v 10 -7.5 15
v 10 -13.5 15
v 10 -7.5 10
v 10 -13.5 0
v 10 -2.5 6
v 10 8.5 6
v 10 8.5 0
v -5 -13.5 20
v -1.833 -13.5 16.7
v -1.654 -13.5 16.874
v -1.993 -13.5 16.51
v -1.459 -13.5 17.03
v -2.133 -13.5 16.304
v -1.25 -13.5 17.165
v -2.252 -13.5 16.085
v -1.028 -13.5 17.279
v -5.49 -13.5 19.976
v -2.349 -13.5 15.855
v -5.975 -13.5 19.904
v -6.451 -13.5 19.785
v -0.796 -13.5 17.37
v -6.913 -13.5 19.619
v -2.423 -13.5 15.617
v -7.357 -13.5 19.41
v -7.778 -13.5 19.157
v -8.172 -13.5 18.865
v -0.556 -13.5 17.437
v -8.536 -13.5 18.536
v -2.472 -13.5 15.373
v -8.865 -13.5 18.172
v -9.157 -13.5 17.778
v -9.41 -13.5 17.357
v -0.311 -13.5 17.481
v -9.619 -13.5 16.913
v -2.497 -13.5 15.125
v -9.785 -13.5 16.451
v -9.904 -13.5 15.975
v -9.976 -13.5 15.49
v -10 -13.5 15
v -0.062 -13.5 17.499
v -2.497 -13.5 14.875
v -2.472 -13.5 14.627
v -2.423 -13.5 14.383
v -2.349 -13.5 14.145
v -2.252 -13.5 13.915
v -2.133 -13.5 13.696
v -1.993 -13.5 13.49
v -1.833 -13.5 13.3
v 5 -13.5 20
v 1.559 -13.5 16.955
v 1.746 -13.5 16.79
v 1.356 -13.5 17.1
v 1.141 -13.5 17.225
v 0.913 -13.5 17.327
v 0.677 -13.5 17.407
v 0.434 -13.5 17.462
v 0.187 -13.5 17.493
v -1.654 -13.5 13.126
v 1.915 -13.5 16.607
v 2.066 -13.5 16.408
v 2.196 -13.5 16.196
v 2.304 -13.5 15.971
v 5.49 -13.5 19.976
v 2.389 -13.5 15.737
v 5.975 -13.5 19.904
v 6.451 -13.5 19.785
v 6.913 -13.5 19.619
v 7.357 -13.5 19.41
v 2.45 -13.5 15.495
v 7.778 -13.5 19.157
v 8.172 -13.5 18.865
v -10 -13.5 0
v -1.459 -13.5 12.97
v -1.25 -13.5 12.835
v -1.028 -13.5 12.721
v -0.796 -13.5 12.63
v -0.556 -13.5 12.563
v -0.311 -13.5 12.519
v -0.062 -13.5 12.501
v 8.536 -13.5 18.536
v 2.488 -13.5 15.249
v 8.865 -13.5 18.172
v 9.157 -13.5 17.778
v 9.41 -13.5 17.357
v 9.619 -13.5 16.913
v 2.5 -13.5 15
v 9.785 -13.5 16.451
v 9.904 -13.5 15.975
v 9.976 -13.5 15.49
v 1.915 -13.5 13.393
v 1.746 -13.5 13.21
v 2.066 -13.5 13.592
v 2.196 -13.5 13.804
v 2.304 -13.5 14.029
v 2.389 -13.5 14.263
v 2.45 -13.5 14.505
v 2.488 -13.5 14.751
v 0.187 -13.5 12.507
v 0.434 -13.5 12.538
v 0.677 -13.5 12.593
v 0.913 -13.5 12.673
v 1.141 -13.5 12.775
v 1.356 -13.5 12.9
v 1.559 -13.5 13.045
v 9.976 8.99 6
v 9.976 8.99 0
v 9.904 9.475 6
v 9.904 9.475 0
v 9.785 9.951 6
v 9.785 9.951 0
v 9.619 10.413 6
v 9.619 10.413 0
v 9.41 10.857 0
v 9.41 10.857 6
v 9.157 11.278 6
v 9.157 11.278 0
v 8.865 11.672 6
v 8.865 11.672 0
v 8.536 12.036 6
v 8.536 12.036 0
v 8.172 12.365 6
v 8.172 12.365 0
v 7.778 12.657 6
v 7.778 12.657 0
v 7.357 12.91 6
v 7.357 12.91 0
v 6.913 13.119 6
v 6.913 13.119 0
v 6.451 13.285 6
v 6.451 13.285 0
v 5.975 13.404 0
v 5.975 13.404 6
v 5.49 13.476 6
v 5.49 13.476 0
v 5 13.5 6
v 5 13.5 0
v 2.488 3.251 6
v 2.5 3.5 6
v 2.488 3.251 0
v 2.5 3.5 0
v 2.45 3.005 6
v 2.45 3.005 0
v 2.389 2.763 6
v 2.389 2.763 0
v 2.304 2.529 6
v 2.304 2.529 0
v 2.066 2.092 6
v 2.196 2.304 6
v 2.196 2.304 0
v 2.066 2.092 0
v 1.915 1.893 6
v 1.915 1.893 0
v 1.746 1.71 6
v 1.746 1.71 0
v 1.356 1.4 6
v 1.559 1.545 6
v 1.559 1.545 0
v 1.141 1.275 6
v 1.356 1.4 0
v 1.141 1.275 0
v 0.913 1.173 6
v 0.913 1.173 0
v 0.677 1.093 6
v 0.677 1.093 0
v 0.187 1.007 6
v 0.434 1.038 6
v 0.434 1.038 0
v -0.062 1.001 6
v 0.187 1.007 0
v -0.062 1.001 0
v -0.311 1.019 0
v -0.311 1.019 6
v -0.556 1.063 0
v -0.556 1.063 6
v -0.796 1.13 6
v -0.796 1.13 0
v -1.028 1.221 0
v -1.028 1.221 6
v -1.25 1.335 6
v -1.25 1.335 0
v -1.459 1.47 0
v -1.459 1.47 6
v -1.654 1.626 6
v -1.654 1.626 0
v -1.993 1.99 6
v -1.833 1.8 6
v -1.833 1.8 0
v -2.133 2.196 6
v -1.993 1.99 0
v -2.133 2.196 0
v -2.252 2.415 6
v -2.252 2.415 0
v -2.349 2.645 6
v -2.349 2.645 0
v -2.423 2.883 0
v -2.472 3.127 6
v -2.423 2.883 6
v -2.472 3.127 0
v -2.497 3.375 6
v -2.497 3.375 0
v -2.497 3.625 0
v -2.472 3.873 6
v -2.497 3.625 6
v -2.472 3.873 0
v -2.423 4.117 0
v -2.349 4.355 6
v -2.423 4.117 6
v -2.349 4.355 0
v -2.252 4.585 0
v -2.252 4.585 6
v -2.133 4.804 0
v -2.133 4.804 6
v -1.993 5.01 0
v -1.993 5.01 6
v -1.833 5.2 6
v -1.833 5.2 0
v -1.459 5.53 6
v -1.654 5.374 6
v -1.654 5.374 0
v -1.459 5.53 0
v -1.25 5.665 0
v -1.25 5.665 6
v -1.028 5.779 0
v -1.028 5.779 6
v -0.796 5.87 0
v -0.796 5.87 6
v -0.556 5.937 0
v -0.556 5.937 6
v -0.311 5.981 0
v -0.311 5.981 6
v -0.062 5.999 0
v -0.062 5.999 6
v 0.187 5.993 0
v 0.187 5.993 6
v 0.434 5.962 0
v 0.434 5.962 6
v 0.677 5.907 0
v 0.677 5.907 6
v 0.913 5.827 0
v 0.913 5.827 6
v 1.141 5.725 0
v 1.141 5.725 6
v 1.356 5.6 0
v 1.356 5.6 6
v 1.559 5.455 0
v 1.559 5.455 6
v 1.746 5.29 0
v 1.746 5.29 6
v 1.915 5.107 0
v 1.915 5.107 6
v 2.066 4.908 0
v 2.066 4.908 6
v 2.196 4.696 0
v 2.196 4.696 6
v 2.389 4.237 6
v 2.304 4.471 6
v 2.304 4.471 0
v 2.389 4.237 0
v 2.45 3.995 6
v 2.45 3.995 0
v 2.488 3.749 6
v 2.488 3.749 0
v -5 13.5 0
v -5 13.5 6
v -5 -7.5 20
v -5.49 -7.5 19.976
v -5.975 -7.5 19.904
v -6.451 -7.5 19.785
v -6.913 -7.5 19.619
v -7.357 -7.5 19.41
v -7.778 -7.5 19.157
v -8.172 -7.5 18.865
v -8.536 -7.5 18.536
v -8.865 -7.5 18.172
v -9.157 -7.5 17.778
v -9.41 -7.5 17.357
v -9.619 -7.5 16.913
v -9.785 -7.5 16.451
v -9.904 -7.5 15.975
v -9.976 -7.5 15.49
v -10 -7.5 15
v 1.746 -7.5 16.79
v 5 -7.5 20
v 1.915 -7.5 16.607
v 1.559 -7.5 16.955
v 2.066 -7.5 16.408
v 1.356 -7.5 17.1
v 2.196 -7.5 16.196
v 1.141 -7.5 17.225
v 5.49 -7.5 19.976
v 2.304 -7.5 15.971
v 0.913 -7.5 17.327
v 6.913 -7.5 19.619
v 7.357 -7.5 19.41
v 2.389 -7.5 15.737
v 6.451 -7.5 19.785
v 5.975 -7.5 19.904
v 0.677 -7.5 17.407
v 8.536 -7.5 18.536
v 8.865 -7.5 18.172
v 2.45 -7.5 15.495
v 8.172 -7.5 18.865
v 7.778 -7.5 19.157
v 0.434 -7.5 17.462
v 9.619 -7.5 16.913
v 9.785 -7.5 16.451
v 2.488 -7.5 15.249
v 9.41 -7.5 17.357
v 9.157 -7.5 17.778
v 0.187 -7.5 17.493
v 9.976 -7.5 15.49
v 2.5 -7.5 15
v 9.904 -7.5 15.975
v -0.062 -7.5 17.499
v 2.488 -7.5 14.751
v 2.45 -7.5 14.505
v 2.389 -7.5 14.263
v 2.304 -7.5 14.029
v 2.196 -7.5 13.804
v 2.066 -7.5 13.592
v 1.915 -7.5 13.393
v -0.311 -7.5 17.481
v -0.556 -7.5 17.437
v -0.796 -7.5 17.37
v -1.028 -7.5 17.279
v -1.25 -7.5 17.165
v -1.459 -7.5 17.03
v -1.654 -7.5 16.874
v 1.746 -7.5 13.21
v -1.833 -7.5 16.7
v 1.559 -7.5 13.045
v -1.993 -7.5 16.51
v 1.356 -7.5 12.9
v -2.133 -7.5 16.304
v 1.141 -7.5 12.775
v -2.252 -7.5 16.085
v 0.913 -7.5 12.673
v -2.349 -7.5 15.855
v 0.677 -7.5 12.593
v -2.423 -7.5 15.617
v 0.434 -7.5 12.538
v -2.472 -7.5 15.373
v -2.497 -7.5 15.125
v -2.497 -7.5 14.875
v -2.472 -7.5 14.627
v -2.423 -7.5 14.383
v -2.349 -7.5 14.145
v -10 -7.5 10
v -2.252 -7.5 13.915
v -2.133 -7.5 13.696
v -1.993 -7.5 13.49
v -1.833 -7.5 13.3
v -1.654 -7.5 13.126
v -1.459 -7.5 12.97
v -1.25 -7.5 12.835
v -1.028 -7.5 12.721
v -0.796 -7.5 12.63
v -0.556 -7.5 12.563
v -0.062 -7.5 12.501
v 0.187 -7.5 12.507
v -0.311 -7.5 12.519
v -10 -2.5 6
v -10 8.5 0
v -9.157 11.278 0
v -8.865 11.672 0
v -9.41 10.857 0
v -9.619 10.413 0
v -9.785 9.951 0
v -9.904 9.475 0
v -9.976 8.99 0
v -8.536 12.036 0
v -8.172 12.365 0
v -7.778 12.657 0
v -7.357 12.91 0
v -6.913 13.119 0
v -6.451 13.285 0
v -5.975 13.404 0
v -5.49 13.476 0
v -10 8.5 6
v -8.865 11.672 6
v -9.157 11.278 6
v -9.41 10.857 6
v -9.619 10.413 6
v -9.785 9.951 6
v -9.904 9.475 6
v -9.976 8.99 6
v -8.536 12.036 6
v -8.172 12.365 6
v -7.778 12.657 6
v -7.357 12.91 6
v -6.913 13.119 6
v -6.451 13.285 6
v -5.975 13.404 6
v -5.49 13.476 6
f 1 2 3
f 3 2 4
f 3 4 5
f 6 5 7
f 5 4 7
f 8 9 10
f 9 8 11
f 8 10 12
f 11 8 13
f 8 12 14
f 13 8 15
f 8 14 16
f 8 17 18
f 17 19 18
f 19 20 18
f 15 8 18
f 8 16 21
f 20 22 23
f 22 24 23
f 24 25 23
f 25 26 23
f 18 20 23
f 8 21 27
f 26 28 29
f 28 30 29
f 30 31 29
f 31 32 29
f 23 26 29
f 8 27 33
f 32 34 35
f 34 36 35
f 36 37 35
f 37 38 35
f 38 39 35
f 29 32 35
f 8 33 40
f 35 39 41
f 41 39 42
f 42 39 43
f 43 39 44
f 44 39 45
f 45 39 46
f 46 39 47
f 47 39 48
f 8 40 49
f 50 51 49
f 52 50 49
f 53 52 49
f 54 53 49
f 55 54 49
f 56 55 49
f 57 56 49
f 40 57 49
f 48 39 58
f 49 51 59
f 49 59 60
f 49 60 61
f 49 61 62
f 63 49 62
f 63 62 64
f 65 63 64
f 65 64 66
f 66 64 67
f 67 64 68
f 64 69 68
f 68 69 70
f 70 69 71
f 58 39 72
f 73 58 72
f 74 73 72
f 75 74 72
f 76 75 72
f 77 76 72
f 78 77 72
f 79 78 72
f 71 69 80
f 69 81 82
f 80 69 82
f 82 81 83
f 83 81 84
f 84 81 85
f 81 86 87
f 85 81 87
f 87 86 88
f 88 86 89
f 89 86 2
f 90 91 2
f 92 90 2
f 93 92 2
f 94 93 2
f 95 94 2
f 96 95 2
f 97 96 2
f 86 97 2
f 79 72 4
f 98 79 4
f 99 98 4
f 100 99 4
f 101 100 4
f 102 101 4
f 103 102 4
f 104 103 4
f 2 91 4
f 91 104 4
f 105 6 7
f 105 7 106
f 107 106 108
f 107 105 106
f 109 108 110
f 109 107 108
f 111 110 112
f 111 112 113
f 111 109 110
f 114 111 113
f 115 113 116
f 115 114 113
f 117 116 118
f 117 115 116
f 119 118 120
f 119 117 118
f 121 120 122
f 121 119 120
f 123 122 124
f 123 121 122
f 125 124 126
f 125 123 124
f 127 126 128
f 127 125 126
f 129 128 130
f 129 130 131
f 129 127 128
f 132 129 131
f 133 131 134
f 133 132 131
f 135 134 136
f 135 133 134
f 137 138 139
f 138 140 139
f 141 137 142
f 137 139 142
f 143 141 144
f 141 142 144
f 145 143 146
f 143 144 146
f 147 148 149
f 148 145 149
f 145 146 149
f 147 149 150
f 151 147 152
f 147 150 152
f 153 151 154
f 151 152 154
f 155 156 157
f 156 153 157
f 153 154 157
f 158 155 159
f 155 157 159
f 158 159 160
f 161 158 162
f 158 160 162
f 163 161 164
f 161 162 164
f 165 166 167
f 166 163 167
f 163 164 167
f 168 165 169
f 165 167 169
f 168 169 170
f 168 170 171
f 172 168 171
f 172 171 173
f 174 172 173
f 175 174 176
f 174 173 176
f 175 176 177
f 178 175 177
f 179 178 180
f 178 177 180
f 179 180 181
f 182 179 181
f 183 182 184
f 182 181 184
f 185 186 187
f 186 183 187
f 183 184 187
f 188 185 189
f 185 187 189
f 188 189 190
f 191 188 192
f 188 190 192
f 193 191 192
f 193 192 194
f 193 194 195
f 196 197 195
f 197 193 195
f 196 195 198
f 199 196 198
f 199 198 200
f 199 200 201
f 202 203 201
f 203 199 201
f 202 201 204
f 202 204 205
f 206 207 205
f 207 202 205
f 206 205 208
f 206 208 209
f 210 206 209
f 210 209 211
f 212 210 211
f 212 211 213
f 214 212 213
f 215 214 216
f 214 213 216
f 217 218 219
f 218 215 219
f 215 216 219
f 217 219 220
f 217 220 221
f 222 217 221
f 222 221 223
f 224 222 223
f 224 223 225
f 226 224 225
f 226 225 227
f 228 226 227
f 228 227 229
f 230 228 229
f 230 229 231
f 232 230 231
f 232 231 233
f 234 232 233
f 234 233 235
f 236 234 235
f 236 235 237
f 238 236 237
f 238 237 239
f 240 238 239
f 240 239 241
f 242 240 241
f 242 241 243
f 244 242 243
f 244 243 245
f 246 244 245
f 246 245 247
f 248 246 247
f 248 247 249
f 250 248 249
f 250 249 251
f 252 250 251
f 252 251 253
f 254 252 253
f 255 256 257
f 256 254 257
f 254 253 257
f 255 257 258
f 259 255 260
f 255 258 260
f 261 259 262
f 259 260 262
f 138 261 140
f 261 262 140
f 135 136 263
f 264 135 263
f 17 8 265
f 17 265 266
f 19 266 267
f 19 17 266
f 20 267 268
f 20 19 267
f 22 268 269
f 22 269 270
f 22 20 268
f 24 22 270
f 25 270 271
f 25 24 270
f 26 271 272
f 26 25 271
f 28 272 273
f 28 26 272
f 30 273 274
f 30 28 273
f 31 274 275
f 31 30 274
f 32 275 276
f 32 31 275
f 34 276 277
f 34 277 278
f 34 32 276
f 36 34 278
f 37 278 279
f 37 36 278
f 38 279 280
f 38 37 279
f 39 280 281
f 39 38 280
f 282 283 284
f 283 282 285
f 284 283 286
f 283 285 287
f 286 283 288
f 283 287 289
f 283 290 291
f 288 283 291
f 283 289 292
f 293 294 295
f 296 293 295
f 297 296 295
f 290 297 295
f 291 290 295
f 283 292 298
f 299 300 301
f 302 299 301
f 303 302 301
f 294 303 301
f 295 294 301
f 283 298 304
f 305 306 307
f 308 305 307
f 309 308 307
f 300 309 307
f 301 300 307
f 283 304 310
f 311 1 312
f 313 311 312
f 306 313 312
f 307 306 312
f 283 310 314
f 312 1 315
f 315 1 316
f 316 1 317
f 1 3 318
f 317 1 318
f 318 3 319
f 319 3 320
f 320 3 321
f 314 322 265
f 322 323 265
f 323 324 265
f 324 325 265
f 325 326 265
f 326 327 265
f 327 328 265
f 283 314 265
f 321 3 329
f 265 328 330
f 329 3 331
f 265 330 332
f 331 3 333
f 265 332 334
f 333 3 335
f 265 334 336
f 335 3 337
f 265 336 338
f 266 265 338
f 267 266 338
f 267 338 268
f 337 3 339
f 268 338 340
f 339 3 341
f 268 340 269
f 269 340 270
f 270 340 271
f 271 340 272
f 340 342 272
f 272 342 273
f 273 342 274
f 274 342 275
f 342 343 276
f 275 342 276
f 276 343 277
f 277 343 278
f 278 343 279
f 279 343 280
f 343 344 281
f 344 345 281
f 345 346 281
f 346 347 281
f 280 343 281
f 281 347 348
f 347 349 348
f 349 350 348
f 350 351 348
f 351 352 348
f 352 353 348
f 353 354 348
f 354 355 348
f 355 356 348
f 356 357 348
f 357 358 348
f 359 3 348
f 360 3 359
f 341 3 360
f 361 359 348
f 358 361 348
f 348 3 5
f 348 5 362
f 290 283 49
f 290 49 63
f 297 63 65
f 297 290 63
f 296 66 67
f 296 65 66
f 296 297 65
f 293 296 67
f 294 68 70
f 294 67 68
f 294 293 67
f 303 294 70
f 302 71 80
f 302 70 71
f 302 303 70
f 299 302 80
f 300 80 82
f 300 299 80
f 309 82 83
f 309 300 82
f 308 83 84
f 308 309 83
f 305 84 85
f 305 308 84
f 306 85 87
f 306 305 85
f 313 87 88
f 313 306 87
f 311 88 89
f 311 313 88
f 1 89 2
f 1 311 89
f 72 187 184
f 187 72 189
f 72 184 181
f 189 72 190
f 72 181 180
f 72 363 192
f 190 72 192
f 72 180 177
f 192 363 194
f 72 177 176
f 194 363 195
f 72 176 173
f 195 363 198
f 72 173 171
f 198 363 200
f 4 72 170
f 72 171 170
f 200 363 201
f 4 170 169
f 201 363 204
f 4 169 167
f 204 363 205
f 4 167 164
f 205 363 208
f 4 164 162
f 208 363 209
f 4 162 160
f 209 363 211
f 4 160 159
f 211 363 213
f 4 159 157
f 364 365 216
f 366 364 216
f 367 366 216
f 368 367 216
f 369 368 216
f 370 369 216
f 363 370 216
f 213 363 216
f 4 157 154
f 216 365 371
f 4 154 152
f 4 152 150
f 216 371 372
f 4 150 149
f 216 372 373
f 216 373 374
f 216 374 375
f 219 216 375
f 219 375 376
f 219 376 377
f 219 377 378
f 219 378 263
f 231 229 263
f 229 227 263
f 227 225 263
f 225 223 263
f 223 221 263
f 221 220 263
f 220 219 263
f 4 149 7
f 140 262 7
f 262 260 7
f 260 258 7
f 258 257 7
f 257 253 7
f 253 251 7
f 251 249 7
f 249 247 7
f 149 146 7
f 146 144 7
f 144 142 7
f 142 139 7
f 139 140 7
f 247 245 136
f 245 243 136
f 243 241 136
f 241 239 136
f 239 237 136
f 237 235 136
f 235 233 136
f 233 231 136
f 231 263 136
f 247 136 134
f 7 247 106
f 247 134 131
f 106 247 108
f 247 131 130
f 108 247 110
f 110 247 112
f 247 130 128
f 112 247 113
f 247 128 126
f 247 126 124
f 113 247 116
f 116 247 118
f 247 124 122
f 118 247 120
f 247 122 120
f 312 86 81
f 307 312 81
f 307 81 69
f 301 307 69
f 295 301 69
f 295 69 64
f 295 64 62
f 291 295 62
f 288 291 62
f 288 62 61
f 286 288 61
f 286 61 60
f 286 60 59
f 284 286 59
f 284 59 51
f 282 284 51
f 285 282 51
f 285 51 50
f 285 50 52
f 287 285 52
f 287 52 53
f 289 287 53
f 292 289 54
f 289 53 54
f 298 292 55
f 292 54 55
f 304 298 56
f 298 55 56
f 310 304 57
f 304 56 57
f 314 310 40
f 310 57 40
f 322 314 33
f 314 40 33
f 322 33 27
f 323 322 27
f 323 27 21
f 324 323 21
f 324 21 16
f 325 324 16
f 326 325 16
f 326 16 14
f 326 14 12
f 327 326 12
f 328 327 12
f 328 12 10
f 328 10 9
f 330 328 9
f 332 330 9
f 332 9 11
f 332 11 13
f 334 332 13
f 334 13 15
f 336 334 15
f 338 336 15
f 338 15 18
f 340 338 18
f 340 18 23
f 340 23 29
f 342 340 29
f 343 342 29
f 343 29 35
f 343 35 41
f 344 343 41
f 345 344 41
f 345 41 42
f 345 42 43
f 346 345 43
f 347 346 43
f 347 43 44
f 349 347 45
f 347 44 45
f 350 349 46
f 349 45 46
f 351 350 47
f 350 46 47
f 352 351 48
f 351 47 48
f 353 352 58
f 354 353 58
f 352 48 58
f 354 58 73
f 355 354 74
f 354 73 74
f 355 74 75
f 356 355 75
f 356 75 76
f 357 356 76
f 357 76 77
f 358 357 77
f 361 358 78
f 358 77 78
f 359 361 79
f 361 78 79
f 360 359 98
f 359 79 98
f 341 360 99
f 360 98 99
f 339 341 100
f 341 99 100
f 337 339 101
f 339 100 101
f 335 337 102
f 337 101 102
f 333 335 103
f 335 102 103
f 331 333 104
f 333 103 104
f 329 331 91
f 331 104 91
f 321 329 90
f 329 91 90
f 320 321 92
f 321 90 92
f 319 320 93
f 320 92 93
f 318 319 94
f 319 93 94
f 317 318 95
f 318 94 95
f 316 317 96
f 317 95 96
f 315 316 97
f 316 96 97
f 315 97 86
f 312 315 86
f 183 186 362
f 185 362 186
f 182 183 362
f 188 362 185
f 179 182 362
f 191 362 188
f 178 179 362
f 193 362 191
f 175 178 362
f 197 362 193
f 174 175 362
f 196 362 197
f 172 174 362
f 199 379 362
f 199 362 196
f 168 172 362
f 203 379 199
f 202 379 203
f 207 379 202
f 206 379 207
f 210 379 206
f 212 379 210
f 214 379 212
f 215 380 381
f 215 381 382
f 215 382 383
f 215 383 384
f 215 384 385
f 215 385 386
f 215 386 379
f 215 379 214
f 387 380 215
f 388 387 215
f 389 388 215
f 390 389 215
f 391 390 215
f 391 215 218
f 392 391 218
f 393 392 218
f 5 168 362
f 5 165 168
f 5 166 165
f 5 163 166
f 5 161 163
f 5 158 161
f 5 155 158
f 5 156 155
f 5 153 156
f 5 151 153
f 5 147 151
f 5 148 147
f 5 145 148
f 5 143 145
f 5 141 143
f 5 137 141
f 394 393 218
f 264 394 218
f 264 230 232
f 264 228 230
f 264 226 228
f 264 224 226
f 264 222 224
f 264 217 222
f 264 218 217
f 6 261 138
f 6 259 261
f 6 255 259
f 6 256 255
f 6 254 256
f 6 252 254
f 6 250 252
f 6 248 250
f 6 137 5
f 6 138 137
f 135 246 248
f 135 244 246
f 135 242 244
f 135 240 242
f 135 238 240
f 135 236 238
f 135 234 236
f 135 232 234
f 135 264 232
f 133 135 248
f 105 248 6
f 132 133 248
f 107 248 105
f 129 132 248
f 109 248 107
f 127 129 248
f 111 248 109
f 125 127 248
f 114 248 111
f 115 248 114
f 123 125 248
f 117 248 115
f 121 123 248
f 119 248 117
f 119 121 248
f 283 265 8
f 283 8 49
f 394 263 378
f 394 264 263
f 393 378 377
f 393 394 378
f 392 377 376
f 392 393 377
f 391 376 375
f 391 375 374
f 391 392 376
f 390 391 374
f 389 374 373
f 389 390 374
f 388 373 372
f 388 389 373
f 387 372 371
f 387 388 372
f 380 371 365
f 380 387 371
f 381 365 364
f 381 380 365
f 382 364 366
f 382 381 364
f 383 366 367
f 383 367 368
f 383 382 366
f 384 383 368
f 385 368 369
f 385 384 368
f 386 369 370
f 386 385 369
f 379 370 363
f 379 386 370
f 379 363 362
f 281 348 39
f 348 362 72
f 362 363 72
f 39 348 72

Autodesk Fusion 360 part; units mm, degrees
sketch "Sketch1" plane through (0, 0, 0) normal (0, 0, 1) x (1, 0, 0)
  line L0 (10, 13.5) -> (-10, 13.5)
  line L1 (-10, 13.5) -> (-10, -13.5)
  line L2 (-10, -13.5) -> (10, -13.5)
  line L3 (10, -13.5) -> (10, 13.5)
  line L4 (10, 13.5) -> (-10, -13.5) construction
  line L5 (-10, 13.5) -> (10, -13.5) construction
  circle A0 centre (0, 3.5) radius 2.5
  line L6 (-10, -13.5) -> (10, -13.5)
  line L7 (10, -13.5) -> (10, -7.5)
  line L8 (10, -7.5) -> (-10, -7.5)
  line L9 (-10, -7.5) -> (-10, -13.5)
  dimension "d1" = 20
  dimension "d2" = 27
  dimension "d3" = 5
  dimension "d4" = 10
  dimension "d5" = 6
extrude "Extrude1" add sketch "Sketch1" along normal blind 6 contours L0 L1 L3 L8
extrude "Extrude2" add sketch "Sketch1" along normal blind 20 contours L1 L2 L3 L6 L7 L8 L9
sketch "Sketch2" plane through (0, -13.5, 0) normal (0, -1, 0) x (1, 0, 0)
  line L0 (-10, 0) -> (10, 0)
  line L1 (10, 0) -> (10, 20)
  line L2 (10, 20) -> (-10, 20)
  line L3 (-10, 20) -> (-10, 0)
  circle A0 centre (0, 15) radius 2.5
  dimension "d10" = 5
  dimension "d11" = 15
extrude "Extrude3" cut sketch "Sketch2" against normal blind 90 contours A0
chamfer "Chamfer1" distance 5 distance2 4 1 edges at (0, -7.5, 6) measured on face at (-0.0623, -4.6643, 6)
fillet "Fillet1" radius 5 4 edges at (10, 13.5, 3) (-10, 13.5, 3) (-10, -10.5, 20) (10, -10.5, 20)
